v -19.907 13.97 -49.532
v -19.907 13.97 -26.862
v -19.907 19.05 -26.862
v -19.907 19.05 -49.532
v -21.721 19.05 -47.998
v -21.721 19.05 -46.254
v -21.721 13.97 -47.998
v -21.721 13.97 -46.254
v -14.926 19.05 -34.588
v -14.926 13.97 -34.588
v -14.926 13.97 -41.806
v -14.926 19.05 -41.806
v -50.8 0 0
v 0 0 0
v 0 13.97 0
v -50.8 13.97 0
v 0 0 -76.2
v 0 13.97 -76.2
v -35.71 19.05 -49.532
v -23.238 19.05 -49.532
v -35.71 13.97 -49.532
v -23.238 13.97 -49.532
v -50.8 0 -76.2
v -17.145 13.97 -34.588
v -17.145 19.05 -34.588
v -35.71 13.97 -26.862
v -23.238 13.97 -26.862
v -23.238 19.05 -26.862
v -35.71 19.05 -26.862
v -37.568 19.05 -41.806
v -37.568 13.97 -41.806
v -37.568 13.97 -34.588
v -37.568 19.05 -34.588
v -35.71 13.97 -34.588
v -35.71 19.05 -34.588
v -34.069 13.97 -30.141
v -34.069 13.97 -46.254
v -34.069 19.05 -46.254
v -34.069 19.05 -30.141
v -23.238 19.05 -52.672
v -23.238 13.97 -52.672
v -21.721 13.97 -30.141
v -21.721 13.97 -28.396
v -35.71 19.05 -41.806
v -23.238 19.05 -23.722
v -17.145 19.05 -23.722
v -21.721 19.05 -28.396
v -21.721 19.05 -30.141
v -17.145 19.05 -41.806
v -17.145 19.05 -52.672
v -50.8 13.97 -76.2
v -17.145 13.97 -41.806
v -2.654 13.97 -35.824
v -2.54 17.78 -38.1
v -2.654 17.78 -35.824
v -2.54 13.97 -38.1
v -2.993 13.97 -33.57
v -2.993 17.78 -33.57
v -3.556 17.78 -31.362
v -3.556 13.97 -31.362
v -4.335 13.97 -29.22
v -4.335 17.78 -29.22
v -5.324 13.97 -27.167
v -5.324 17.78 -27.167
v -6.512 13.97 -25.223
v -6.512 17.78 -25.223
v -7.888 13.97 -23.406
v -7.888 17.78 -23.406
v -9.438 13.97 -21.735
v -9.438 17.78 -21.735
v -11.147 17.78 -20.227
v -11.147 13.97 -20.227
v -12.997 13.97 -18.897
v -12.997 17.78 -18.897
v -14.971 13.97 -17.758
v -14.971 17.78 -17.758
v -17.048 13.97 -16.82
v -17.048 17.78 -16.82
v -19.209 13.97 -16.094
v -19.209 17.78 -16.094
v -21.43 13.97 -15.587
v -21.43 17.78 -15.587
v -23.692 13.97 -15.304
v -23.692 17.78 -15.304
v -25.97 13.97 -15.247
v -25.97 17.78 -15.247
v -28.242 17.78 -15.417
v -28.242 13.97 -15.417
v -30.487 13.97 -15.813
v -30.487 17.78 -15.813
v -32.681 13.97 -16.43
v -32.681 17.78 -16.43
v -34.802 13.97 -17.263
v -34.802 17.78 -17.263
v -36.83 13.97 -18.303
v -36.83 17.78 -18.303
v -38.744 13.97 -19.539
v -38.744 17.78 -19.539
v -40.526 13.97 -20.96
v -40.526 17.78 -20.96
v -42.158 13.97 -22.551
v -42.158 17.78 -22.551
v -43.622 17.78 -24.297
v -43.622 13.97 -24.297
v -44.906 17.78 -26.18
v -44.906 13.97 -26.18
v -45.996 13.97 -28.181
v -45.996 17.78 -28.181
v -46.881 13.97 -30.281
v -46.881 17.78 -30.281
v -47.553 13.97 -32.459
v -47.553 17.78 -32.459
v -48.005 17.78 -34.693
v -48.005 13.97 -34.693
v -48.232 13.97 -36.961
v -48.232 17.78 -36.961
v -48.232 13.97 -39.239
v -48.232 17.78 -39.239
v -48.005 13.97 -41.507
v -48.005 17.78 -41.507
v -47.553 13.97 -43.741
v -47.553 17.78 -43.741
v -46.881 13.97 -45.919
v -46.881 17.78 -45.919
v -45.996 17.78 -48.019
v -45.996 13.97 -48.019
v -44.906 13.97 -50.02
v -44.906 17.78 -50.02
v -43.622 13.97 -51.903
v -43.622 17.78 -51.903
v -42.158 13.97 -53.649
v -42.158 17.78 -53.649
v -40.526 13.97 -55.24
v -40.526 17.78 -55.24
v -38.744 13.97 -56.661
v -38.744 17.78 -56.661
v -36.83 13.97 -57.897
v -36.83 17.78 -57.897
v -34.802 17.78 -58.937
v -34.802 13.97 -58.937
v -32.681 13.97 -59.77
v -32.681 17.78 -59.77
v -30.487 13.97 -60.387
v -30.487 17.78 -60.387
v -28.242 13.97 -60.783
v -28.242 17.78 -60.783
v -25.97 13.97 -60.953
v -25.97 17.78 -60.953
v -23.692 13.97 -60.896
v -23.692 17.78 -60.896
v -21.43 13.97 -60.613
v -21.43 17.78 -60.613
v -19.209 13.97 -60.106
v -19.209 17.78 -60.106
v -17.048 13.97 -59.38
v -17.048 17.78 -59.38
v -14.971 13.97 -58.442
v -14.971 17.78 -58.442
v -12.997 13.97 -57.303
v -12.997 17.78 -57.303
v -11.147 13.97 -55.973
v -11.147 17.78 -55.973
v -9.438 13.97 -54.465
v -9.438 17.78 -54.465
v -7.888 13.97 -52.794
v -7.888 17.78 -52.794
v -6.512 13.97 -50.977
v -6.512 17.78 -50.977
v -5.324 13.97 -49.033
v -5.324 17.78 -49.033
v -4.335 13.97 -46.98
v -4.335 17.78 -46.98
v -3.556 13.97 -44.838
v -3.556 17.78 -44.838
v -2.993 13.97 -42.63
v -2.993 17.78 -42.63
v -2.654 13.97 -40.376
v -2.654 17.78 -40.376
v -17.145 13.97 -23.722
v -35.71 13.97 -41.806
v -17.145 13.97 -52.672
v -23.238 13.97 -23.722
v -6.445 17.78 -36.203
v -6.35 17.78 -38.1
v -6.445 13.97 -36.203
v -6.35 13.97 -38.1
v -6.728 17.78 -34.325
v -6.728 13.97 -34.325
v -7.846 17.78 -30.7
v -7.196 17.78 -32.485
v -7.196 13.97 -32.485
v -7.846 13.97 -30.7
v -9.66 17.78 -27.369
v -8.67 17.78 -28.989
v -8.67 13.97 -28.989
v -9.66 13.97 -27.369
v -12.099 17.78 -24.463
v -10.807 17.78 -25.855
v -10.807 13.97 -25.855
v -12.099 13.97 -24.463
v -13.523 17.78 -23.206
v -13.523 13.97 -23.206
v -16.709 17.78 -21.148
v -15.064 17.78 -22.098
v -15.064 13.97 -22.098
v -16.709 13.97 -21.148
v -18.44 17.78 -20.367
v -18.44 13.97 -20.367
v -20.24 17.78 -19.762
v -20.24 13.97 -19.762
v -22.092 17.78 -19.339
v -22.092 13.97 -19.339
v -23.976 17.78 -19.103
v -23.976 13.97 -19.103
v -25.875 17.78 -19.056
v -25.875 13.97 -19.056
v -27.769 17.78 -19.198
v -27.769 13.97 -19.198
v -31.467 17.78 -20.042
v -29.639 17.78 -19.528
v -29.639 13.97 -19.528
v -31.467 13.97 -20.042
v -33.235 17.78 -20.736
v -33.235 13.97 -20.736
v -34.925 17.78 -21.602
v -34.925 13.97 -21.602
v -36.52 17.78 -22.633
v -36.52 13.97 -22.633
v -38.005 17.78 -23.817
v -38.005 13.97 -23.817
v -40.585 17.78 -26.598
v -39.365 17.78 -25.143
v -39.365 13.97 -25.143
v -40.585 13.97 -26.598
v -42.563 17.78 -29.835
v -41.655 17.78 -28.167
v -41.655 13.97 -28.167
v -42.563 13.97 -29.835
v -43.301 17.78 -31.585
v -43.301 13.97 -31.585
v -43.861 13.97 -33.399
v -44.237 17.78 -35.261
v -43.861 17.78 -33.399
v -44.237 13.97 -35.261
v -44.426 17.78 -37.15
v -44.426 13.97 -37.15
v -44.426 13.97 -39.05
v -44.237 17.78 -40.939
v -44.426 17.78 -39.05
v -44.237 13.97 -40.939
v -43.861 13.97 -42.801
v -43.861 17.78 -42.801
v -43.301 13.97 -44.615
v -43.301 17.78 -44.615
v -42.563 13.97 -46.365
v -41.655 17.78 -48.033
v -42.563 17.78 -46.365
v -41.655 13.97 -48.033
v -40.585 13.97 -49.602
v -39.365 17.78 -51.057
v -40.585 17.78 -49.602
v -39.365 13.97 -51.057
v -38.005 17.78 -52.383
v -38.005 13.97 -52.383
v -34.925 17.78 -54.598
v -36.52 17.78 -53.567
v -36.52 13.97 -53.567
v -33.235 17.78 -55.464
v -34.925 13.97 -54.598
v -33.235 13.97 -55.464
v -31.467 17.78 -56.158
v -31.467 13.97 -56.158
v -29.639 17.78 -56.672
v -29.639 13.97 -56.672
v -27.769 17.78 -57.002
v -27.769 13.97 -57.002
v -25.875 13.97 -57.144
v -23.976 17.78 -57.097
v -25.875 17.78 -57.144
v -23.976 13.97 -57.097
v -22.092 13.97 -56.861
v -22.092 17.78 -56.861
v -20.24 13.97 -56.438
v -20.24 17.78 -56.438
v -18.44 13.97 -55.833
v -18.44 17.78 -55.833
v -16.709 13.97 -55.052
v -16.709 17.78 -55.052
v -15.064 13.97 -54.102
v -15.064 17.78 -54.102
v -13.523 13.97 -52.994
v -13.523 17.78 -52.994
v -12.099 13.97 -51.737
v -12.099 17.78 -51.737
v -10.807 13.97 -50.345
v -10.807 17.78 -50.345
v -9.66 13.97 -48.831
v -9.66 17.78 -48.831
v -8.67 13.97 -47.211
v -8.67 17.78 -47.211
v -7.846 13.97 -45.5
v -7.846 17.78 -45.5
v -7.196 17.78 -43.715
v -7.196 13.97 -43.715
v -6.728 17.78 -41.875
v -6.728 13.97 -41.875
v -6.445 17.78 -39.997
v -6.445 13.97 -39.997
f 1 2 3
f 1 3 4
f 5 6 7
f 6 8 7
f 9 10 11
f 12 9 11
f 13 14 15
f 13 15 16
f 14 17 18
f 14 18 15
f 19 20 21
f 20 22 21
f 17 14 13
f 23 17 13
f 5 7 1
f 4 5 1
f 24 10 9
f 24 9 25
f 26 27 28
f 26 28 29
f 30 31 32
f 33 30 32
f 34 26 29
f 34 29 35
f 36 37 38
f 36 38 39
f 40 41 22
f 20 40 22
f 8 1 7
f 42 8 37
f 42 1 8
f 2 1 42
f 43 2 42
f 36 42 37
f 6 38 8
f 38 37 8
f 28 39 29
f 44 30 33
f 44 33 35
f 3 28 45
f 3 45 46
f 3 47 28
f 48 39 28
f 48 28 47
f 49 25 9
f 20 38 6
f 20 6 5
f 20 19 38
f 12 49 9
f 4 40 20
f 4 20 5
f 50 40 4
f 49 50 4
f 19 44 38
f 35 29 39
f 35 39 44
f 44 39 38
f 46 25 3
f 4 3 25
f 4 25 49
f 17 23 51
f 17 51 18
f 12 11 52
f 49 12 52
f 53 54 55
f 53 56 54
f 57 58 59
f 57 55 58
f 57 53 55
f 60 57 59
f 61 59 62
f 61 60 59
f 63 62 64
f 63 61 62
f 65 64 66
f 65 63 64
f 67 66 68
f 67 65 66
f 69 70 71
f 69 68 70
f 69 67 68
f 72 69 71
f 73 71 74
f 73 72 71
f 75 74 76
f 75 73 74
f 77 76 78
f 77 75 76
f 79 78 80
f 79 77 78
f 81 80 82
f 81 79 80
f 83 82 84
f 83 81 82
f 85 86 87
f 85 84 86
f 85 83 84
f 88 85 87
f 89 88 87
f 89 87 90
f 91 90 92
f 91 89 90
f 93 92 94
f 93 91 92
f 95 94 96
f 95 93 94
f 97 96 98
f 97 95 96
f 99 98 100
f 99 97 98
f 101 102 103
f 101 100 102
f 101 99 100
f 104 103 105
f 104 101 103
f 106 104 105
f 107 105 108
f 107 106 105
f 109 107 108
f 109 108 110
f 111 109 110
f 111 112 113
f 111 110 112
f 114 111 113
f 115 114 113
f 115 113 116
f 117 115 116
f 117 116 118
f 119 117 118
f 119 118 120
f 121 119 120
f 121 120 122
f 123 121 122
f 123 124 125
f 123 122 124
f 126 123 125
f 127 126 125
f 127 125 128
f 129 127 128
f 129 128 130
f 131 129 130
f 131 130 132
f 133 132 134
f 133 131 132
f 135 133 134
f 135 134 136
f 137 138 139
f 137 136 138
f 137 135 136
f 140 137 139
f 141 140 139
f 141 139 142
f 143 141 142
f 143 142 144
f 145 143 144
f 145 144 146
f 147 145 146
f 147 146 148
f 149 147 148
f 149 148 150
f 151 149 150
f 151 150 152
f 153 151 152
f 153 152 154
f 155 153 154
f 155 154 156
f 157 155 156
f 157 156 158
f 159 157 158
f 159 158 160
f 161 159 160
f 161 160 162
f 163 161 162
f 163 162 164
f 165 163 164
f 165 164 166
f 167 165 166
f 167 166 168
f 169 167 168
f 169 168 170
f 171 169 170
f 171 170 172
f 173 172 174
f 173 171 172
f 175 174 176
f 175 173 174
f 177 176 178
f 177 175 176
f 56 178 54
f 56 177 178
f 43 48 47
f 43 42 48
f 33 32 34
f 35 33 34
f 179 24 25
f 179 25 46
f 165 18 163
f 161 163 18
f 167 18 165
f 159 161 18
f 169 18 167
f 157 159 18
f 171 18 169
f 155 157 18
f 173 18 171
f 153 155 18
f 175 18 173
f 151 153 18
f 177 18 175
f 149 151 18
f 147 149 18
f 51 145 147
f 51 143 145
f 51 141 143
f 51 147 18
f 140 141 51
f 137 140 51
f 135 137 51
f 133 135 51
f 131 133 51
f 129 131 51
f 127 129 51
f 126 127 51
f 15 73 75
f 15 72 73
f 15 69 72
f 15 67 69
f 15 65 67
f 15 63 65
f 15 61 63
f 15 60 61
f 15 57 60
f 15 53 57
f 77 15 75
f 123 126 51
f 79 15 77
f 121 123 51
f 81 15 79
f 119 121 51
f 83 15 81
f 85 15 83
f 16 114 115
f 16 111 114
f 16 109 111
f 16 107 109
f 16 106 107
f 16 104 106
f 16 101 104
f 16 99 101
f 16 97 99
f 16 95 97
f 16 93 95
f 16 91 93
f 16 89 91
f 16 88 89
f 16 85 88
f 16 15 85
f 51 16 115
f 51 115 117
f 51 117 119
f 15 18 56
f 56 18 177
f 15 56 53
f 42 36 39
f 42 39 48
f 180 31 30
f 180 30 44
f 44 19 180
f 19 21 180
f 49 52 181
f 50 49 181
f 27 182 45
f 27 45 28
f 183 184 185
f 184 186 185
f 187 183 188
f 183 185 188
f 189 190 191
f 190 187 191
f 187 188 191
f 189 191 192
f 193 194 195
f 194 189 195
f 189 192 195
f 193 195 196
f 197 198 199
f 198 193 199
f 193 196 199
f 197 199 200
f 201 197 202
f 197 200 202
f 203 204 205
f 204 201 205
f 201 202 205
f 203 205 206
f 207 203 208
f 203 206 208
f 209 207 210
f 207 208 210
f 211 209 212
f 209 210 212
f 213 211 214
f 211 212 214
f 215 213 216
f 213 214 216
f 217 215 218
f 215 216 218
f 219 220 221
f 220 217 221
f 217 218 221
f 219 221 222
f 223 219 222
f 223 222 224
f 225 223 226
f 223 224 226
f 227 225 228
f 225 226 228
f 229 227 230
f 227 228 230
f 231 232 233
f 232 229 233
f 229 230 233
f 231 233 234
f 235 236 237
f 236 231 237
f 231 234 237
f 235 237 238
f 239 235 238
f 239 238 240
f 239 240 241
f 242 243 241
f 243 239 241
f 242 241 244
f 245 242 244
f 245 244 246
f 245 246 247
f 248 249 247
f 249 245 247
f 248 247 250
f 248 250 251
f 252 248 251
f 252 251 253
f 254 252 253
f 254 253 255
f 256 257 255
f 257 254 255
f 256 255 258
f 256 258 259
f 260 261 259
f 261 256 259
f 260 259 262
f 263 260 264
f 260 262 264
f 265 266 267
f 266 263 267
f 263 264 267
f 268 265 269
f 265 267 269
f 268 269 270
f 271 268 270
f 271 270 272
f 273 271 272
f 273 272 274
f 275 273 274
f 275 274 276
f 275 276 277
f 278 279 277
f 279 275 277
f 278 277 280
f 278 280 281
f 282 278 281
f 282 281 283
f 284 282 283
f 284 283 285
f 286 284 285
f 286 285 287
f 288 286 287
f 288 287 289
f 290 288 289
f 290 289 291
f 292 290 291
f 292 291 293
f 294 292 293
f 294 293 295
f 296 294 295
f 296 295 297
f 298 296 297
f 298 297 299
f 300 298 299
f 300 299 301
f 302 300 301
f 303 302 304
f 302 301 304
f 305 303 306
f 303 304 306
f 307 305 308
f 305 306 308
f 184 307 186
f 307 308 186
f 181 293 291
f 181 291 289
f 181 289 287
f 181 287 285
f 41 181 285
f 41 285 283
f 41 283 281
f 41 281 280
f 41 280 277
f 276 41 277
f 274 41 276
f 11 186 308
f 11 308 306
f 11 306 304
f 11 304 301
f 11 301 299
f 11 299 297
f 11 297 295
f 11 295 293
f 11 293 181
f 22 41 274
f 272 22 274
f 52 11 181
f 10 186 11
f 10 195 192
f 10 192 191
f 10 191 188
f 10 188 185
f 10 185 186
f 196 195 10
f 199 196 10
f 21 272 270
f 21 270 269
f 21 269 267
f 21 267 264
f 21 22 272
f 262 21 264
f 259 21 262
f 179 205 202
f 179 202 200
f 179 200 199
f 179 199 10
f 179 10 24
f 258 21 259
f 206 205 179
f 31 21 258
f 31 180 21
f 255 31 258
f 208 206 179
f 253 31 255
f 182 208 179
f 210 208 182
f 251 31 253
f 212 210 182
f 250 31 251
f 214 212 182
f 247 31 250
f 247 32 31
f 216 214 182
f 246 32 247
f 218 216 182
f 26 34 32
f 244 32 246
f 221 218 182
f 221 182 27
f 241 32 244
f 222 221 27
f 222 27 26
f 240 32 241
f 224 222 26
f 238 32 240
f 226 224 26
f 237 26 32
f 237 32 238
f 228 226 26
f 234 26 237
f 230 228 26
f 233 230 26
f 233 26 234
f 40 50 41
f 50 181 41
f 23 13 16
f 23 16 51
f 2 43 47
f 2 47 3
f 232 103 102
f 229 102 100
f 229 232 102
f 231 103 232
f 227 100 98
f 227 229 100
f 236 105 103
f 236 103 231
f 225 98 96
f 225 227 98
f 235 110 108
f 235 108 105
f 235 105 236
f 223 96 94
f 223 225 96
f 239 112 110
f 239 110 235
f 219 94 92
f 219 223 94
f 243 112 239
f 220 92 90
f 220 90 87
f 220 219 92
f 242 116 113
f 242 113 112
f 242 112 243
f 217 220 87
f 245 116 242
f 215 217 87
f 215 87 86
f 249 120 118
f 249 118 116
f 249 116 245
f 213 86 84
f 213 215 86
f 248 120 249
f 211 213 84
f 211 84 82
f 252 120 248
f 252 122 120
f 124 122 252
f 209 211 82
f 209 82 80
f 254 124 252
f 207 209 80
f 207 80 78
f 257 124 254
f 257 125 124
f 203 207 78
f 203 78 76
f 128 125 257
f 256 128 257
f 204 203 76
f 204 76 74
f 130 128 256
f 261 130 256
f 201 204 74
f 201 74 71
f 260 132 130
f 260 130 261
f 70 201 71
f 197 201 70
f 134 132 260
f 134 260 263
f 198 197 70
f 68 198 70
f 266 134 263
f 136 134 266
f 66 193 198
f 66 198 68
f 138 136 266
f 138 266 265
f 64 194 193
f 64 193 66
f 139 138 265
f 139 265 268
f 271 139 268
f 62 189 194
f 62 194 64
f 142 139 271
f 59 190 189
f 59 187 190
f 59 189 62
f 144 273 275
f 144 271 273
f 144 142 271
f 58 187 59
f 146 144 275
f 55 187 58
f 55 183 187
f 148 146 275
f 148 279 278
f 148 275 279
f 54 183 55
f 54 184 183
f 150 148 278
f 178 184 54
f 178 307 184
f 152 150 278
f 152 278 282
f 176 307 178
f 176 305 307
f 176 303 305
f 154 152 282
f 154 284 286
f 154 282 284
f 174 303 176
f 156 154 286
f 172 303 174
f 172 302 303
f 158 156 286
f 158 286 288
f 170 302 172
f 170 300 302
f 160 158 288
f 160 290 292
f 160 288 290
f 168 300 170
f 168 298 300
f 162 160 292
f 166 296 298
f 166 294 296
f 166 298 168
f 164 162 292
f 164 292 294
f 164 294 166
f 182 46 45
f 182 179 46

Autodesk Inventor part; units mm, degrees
ref_plane "YZ Plane" through (0, 0, 0) normal (1, 0, 0) x (0, 1, 0)
ref_plane "XZ Plane" through (0, 0, 0) normal (0, 1, 0) x (-1, 0, 0)
ref_plane "XY Plane" through (0, 0, 0) normal (0, 0, 1) x (1, 0, 0)
sketch "Sketch1" plane through (0, 0, 0) normal (0, 1, 0) x (-1, 0, 0)
  line L0 (0, 0) -> (50.8, 0)
  line L1 (50.8, 0) -> (50.8, -76.2)
  line L2 (50.8, -76.2) -> (0, -76.2)
  line L3 (0, -76.2) -> (0, 0)
  dimension "d0" = 50.8
  dimension "d1" = 76.2
extrude "Extrusion1" add sketch "Sketch1" along normal blind 13.97
sketch "Sketch6" plane through (0, 13.97, 0) normal (0, 1, 0) x (1, 0, 0)
  point P0 (0, 0)
sketch "Sketch7" plane through (0, 13.97, 0) normal (0, 1, 0) x (1, 0, 0)
  point P0 (0, 0)
sketch "Sketch8" plane through (0, 13.97, 0) normal (0, 1, 0) x (1, 0, 0)
  circle A0 centre (-25.4, 38.1) radius 22.86
  circle A1 centre (-25.4, 38.1) radius 19.05
  point P0 (0, 0)
  dimension "d30" = 45.72
  dimension "d31" = 38.1
extrude "Extrusion15" add sketch "Sketch8" along normal blind 3.81
sketch "Sketch9" plane through (-25.4, 13.97, -38.1) normal (0, 1, 0) x (1, 0, 0)
  line L0 (-8.6694, 8.1535) -> (3.6792, 8.1535)
  line L1 (3.6792, 8.1535) -> (3.6792, 9.8977)
  line L2 (3.6792, 9.8977) -> (5.4931, 11.4325)
  line L3 (5.4931, 11.4325) -> (5.4931, 0.0971)
  line L4 (-8.6694, 8.1535) -> (-8.6694, 0.0971)
  line L5 (-8.6694, -7.9593) -> (3.6792, -7.9593)
  line L6 (3.6792, -7.9593) -> (3.6792, -9.7035)
  line L7 (3.6792, -9.7035) -> (5.4931, -11.2383)
  line L8 (5.4931, -11.2383) -> (5.4931, 0.0971)
  line L9 (-8.6694, -7.9593) -> (-8.6694, 0.0971)
  line L10 (8.2546, 0.0971) -> (8.2546, -14.3778)
  line L11 (8.2546, -14.3778) -> (2.1623, -14.3778)
  line L12 (2.1623, -14.3778) -> (2.1623, -11.2383)
  line L13 (2.1623, -11.2383) -> (-10.3102, -11.2383)
  line L14 (-10.3102, -11.2383) -> (-10.3102, 0.0971)
  line L15 (8.2546, 0.0971) -> (8.2546, 14.572)
  line L16 (8.2546, 14.572) -> (2.1623, 14.572)
  line L17 (2.1623, 14.572) -> (2.1623, 11.4325)
  line L18 (2.1623, 11.4325) -> (-10.3102, 11.4325)
  line L19 (-10.3102, 11.4325) -> (-10.3102, 0.0971)
  line L20 (-12.1685, 0.0971) -> (-12.1685, -3.512)
  line L21 (-12.1685, -3.512) -> (-10.3102, -3.512)
  line L22 (-10.3102, -3.512) -> (-10.3102, 0.0971)
  line L23 (-12.1685, 0.0971) -> (-12.1685, 3.7061)
  line L24 (-12.1685, 3.7061) -> (-10.3102, 3.7061)
  line L25 (10.4745, 0.0971) -> (10.4745, -3.512)
  line L26 (10.4745, -3.512) -> (8.2546, -3.512)
  line L27 (8.2546, -3.512) -> (8.2546, 0.0971)
  line L28 (10.4745, 0.0971) -> (10.4745, 3.7061)
  line L29 (10.4745, 3.7061) -> (8.2546, 3.7061)
  point P0 (25.4, -38.1)
  point P1 (8.2546, -3.512)
  point P2 (8.2546, 3.7061)
  point P3 (-10.3102, 3.7061)
  point P4 (-10.3102, -3.512)
extrude "Extrusion16" add sketch "Sketch9" along normal blind 5.08
properties part number "CNC#2 FInal"
